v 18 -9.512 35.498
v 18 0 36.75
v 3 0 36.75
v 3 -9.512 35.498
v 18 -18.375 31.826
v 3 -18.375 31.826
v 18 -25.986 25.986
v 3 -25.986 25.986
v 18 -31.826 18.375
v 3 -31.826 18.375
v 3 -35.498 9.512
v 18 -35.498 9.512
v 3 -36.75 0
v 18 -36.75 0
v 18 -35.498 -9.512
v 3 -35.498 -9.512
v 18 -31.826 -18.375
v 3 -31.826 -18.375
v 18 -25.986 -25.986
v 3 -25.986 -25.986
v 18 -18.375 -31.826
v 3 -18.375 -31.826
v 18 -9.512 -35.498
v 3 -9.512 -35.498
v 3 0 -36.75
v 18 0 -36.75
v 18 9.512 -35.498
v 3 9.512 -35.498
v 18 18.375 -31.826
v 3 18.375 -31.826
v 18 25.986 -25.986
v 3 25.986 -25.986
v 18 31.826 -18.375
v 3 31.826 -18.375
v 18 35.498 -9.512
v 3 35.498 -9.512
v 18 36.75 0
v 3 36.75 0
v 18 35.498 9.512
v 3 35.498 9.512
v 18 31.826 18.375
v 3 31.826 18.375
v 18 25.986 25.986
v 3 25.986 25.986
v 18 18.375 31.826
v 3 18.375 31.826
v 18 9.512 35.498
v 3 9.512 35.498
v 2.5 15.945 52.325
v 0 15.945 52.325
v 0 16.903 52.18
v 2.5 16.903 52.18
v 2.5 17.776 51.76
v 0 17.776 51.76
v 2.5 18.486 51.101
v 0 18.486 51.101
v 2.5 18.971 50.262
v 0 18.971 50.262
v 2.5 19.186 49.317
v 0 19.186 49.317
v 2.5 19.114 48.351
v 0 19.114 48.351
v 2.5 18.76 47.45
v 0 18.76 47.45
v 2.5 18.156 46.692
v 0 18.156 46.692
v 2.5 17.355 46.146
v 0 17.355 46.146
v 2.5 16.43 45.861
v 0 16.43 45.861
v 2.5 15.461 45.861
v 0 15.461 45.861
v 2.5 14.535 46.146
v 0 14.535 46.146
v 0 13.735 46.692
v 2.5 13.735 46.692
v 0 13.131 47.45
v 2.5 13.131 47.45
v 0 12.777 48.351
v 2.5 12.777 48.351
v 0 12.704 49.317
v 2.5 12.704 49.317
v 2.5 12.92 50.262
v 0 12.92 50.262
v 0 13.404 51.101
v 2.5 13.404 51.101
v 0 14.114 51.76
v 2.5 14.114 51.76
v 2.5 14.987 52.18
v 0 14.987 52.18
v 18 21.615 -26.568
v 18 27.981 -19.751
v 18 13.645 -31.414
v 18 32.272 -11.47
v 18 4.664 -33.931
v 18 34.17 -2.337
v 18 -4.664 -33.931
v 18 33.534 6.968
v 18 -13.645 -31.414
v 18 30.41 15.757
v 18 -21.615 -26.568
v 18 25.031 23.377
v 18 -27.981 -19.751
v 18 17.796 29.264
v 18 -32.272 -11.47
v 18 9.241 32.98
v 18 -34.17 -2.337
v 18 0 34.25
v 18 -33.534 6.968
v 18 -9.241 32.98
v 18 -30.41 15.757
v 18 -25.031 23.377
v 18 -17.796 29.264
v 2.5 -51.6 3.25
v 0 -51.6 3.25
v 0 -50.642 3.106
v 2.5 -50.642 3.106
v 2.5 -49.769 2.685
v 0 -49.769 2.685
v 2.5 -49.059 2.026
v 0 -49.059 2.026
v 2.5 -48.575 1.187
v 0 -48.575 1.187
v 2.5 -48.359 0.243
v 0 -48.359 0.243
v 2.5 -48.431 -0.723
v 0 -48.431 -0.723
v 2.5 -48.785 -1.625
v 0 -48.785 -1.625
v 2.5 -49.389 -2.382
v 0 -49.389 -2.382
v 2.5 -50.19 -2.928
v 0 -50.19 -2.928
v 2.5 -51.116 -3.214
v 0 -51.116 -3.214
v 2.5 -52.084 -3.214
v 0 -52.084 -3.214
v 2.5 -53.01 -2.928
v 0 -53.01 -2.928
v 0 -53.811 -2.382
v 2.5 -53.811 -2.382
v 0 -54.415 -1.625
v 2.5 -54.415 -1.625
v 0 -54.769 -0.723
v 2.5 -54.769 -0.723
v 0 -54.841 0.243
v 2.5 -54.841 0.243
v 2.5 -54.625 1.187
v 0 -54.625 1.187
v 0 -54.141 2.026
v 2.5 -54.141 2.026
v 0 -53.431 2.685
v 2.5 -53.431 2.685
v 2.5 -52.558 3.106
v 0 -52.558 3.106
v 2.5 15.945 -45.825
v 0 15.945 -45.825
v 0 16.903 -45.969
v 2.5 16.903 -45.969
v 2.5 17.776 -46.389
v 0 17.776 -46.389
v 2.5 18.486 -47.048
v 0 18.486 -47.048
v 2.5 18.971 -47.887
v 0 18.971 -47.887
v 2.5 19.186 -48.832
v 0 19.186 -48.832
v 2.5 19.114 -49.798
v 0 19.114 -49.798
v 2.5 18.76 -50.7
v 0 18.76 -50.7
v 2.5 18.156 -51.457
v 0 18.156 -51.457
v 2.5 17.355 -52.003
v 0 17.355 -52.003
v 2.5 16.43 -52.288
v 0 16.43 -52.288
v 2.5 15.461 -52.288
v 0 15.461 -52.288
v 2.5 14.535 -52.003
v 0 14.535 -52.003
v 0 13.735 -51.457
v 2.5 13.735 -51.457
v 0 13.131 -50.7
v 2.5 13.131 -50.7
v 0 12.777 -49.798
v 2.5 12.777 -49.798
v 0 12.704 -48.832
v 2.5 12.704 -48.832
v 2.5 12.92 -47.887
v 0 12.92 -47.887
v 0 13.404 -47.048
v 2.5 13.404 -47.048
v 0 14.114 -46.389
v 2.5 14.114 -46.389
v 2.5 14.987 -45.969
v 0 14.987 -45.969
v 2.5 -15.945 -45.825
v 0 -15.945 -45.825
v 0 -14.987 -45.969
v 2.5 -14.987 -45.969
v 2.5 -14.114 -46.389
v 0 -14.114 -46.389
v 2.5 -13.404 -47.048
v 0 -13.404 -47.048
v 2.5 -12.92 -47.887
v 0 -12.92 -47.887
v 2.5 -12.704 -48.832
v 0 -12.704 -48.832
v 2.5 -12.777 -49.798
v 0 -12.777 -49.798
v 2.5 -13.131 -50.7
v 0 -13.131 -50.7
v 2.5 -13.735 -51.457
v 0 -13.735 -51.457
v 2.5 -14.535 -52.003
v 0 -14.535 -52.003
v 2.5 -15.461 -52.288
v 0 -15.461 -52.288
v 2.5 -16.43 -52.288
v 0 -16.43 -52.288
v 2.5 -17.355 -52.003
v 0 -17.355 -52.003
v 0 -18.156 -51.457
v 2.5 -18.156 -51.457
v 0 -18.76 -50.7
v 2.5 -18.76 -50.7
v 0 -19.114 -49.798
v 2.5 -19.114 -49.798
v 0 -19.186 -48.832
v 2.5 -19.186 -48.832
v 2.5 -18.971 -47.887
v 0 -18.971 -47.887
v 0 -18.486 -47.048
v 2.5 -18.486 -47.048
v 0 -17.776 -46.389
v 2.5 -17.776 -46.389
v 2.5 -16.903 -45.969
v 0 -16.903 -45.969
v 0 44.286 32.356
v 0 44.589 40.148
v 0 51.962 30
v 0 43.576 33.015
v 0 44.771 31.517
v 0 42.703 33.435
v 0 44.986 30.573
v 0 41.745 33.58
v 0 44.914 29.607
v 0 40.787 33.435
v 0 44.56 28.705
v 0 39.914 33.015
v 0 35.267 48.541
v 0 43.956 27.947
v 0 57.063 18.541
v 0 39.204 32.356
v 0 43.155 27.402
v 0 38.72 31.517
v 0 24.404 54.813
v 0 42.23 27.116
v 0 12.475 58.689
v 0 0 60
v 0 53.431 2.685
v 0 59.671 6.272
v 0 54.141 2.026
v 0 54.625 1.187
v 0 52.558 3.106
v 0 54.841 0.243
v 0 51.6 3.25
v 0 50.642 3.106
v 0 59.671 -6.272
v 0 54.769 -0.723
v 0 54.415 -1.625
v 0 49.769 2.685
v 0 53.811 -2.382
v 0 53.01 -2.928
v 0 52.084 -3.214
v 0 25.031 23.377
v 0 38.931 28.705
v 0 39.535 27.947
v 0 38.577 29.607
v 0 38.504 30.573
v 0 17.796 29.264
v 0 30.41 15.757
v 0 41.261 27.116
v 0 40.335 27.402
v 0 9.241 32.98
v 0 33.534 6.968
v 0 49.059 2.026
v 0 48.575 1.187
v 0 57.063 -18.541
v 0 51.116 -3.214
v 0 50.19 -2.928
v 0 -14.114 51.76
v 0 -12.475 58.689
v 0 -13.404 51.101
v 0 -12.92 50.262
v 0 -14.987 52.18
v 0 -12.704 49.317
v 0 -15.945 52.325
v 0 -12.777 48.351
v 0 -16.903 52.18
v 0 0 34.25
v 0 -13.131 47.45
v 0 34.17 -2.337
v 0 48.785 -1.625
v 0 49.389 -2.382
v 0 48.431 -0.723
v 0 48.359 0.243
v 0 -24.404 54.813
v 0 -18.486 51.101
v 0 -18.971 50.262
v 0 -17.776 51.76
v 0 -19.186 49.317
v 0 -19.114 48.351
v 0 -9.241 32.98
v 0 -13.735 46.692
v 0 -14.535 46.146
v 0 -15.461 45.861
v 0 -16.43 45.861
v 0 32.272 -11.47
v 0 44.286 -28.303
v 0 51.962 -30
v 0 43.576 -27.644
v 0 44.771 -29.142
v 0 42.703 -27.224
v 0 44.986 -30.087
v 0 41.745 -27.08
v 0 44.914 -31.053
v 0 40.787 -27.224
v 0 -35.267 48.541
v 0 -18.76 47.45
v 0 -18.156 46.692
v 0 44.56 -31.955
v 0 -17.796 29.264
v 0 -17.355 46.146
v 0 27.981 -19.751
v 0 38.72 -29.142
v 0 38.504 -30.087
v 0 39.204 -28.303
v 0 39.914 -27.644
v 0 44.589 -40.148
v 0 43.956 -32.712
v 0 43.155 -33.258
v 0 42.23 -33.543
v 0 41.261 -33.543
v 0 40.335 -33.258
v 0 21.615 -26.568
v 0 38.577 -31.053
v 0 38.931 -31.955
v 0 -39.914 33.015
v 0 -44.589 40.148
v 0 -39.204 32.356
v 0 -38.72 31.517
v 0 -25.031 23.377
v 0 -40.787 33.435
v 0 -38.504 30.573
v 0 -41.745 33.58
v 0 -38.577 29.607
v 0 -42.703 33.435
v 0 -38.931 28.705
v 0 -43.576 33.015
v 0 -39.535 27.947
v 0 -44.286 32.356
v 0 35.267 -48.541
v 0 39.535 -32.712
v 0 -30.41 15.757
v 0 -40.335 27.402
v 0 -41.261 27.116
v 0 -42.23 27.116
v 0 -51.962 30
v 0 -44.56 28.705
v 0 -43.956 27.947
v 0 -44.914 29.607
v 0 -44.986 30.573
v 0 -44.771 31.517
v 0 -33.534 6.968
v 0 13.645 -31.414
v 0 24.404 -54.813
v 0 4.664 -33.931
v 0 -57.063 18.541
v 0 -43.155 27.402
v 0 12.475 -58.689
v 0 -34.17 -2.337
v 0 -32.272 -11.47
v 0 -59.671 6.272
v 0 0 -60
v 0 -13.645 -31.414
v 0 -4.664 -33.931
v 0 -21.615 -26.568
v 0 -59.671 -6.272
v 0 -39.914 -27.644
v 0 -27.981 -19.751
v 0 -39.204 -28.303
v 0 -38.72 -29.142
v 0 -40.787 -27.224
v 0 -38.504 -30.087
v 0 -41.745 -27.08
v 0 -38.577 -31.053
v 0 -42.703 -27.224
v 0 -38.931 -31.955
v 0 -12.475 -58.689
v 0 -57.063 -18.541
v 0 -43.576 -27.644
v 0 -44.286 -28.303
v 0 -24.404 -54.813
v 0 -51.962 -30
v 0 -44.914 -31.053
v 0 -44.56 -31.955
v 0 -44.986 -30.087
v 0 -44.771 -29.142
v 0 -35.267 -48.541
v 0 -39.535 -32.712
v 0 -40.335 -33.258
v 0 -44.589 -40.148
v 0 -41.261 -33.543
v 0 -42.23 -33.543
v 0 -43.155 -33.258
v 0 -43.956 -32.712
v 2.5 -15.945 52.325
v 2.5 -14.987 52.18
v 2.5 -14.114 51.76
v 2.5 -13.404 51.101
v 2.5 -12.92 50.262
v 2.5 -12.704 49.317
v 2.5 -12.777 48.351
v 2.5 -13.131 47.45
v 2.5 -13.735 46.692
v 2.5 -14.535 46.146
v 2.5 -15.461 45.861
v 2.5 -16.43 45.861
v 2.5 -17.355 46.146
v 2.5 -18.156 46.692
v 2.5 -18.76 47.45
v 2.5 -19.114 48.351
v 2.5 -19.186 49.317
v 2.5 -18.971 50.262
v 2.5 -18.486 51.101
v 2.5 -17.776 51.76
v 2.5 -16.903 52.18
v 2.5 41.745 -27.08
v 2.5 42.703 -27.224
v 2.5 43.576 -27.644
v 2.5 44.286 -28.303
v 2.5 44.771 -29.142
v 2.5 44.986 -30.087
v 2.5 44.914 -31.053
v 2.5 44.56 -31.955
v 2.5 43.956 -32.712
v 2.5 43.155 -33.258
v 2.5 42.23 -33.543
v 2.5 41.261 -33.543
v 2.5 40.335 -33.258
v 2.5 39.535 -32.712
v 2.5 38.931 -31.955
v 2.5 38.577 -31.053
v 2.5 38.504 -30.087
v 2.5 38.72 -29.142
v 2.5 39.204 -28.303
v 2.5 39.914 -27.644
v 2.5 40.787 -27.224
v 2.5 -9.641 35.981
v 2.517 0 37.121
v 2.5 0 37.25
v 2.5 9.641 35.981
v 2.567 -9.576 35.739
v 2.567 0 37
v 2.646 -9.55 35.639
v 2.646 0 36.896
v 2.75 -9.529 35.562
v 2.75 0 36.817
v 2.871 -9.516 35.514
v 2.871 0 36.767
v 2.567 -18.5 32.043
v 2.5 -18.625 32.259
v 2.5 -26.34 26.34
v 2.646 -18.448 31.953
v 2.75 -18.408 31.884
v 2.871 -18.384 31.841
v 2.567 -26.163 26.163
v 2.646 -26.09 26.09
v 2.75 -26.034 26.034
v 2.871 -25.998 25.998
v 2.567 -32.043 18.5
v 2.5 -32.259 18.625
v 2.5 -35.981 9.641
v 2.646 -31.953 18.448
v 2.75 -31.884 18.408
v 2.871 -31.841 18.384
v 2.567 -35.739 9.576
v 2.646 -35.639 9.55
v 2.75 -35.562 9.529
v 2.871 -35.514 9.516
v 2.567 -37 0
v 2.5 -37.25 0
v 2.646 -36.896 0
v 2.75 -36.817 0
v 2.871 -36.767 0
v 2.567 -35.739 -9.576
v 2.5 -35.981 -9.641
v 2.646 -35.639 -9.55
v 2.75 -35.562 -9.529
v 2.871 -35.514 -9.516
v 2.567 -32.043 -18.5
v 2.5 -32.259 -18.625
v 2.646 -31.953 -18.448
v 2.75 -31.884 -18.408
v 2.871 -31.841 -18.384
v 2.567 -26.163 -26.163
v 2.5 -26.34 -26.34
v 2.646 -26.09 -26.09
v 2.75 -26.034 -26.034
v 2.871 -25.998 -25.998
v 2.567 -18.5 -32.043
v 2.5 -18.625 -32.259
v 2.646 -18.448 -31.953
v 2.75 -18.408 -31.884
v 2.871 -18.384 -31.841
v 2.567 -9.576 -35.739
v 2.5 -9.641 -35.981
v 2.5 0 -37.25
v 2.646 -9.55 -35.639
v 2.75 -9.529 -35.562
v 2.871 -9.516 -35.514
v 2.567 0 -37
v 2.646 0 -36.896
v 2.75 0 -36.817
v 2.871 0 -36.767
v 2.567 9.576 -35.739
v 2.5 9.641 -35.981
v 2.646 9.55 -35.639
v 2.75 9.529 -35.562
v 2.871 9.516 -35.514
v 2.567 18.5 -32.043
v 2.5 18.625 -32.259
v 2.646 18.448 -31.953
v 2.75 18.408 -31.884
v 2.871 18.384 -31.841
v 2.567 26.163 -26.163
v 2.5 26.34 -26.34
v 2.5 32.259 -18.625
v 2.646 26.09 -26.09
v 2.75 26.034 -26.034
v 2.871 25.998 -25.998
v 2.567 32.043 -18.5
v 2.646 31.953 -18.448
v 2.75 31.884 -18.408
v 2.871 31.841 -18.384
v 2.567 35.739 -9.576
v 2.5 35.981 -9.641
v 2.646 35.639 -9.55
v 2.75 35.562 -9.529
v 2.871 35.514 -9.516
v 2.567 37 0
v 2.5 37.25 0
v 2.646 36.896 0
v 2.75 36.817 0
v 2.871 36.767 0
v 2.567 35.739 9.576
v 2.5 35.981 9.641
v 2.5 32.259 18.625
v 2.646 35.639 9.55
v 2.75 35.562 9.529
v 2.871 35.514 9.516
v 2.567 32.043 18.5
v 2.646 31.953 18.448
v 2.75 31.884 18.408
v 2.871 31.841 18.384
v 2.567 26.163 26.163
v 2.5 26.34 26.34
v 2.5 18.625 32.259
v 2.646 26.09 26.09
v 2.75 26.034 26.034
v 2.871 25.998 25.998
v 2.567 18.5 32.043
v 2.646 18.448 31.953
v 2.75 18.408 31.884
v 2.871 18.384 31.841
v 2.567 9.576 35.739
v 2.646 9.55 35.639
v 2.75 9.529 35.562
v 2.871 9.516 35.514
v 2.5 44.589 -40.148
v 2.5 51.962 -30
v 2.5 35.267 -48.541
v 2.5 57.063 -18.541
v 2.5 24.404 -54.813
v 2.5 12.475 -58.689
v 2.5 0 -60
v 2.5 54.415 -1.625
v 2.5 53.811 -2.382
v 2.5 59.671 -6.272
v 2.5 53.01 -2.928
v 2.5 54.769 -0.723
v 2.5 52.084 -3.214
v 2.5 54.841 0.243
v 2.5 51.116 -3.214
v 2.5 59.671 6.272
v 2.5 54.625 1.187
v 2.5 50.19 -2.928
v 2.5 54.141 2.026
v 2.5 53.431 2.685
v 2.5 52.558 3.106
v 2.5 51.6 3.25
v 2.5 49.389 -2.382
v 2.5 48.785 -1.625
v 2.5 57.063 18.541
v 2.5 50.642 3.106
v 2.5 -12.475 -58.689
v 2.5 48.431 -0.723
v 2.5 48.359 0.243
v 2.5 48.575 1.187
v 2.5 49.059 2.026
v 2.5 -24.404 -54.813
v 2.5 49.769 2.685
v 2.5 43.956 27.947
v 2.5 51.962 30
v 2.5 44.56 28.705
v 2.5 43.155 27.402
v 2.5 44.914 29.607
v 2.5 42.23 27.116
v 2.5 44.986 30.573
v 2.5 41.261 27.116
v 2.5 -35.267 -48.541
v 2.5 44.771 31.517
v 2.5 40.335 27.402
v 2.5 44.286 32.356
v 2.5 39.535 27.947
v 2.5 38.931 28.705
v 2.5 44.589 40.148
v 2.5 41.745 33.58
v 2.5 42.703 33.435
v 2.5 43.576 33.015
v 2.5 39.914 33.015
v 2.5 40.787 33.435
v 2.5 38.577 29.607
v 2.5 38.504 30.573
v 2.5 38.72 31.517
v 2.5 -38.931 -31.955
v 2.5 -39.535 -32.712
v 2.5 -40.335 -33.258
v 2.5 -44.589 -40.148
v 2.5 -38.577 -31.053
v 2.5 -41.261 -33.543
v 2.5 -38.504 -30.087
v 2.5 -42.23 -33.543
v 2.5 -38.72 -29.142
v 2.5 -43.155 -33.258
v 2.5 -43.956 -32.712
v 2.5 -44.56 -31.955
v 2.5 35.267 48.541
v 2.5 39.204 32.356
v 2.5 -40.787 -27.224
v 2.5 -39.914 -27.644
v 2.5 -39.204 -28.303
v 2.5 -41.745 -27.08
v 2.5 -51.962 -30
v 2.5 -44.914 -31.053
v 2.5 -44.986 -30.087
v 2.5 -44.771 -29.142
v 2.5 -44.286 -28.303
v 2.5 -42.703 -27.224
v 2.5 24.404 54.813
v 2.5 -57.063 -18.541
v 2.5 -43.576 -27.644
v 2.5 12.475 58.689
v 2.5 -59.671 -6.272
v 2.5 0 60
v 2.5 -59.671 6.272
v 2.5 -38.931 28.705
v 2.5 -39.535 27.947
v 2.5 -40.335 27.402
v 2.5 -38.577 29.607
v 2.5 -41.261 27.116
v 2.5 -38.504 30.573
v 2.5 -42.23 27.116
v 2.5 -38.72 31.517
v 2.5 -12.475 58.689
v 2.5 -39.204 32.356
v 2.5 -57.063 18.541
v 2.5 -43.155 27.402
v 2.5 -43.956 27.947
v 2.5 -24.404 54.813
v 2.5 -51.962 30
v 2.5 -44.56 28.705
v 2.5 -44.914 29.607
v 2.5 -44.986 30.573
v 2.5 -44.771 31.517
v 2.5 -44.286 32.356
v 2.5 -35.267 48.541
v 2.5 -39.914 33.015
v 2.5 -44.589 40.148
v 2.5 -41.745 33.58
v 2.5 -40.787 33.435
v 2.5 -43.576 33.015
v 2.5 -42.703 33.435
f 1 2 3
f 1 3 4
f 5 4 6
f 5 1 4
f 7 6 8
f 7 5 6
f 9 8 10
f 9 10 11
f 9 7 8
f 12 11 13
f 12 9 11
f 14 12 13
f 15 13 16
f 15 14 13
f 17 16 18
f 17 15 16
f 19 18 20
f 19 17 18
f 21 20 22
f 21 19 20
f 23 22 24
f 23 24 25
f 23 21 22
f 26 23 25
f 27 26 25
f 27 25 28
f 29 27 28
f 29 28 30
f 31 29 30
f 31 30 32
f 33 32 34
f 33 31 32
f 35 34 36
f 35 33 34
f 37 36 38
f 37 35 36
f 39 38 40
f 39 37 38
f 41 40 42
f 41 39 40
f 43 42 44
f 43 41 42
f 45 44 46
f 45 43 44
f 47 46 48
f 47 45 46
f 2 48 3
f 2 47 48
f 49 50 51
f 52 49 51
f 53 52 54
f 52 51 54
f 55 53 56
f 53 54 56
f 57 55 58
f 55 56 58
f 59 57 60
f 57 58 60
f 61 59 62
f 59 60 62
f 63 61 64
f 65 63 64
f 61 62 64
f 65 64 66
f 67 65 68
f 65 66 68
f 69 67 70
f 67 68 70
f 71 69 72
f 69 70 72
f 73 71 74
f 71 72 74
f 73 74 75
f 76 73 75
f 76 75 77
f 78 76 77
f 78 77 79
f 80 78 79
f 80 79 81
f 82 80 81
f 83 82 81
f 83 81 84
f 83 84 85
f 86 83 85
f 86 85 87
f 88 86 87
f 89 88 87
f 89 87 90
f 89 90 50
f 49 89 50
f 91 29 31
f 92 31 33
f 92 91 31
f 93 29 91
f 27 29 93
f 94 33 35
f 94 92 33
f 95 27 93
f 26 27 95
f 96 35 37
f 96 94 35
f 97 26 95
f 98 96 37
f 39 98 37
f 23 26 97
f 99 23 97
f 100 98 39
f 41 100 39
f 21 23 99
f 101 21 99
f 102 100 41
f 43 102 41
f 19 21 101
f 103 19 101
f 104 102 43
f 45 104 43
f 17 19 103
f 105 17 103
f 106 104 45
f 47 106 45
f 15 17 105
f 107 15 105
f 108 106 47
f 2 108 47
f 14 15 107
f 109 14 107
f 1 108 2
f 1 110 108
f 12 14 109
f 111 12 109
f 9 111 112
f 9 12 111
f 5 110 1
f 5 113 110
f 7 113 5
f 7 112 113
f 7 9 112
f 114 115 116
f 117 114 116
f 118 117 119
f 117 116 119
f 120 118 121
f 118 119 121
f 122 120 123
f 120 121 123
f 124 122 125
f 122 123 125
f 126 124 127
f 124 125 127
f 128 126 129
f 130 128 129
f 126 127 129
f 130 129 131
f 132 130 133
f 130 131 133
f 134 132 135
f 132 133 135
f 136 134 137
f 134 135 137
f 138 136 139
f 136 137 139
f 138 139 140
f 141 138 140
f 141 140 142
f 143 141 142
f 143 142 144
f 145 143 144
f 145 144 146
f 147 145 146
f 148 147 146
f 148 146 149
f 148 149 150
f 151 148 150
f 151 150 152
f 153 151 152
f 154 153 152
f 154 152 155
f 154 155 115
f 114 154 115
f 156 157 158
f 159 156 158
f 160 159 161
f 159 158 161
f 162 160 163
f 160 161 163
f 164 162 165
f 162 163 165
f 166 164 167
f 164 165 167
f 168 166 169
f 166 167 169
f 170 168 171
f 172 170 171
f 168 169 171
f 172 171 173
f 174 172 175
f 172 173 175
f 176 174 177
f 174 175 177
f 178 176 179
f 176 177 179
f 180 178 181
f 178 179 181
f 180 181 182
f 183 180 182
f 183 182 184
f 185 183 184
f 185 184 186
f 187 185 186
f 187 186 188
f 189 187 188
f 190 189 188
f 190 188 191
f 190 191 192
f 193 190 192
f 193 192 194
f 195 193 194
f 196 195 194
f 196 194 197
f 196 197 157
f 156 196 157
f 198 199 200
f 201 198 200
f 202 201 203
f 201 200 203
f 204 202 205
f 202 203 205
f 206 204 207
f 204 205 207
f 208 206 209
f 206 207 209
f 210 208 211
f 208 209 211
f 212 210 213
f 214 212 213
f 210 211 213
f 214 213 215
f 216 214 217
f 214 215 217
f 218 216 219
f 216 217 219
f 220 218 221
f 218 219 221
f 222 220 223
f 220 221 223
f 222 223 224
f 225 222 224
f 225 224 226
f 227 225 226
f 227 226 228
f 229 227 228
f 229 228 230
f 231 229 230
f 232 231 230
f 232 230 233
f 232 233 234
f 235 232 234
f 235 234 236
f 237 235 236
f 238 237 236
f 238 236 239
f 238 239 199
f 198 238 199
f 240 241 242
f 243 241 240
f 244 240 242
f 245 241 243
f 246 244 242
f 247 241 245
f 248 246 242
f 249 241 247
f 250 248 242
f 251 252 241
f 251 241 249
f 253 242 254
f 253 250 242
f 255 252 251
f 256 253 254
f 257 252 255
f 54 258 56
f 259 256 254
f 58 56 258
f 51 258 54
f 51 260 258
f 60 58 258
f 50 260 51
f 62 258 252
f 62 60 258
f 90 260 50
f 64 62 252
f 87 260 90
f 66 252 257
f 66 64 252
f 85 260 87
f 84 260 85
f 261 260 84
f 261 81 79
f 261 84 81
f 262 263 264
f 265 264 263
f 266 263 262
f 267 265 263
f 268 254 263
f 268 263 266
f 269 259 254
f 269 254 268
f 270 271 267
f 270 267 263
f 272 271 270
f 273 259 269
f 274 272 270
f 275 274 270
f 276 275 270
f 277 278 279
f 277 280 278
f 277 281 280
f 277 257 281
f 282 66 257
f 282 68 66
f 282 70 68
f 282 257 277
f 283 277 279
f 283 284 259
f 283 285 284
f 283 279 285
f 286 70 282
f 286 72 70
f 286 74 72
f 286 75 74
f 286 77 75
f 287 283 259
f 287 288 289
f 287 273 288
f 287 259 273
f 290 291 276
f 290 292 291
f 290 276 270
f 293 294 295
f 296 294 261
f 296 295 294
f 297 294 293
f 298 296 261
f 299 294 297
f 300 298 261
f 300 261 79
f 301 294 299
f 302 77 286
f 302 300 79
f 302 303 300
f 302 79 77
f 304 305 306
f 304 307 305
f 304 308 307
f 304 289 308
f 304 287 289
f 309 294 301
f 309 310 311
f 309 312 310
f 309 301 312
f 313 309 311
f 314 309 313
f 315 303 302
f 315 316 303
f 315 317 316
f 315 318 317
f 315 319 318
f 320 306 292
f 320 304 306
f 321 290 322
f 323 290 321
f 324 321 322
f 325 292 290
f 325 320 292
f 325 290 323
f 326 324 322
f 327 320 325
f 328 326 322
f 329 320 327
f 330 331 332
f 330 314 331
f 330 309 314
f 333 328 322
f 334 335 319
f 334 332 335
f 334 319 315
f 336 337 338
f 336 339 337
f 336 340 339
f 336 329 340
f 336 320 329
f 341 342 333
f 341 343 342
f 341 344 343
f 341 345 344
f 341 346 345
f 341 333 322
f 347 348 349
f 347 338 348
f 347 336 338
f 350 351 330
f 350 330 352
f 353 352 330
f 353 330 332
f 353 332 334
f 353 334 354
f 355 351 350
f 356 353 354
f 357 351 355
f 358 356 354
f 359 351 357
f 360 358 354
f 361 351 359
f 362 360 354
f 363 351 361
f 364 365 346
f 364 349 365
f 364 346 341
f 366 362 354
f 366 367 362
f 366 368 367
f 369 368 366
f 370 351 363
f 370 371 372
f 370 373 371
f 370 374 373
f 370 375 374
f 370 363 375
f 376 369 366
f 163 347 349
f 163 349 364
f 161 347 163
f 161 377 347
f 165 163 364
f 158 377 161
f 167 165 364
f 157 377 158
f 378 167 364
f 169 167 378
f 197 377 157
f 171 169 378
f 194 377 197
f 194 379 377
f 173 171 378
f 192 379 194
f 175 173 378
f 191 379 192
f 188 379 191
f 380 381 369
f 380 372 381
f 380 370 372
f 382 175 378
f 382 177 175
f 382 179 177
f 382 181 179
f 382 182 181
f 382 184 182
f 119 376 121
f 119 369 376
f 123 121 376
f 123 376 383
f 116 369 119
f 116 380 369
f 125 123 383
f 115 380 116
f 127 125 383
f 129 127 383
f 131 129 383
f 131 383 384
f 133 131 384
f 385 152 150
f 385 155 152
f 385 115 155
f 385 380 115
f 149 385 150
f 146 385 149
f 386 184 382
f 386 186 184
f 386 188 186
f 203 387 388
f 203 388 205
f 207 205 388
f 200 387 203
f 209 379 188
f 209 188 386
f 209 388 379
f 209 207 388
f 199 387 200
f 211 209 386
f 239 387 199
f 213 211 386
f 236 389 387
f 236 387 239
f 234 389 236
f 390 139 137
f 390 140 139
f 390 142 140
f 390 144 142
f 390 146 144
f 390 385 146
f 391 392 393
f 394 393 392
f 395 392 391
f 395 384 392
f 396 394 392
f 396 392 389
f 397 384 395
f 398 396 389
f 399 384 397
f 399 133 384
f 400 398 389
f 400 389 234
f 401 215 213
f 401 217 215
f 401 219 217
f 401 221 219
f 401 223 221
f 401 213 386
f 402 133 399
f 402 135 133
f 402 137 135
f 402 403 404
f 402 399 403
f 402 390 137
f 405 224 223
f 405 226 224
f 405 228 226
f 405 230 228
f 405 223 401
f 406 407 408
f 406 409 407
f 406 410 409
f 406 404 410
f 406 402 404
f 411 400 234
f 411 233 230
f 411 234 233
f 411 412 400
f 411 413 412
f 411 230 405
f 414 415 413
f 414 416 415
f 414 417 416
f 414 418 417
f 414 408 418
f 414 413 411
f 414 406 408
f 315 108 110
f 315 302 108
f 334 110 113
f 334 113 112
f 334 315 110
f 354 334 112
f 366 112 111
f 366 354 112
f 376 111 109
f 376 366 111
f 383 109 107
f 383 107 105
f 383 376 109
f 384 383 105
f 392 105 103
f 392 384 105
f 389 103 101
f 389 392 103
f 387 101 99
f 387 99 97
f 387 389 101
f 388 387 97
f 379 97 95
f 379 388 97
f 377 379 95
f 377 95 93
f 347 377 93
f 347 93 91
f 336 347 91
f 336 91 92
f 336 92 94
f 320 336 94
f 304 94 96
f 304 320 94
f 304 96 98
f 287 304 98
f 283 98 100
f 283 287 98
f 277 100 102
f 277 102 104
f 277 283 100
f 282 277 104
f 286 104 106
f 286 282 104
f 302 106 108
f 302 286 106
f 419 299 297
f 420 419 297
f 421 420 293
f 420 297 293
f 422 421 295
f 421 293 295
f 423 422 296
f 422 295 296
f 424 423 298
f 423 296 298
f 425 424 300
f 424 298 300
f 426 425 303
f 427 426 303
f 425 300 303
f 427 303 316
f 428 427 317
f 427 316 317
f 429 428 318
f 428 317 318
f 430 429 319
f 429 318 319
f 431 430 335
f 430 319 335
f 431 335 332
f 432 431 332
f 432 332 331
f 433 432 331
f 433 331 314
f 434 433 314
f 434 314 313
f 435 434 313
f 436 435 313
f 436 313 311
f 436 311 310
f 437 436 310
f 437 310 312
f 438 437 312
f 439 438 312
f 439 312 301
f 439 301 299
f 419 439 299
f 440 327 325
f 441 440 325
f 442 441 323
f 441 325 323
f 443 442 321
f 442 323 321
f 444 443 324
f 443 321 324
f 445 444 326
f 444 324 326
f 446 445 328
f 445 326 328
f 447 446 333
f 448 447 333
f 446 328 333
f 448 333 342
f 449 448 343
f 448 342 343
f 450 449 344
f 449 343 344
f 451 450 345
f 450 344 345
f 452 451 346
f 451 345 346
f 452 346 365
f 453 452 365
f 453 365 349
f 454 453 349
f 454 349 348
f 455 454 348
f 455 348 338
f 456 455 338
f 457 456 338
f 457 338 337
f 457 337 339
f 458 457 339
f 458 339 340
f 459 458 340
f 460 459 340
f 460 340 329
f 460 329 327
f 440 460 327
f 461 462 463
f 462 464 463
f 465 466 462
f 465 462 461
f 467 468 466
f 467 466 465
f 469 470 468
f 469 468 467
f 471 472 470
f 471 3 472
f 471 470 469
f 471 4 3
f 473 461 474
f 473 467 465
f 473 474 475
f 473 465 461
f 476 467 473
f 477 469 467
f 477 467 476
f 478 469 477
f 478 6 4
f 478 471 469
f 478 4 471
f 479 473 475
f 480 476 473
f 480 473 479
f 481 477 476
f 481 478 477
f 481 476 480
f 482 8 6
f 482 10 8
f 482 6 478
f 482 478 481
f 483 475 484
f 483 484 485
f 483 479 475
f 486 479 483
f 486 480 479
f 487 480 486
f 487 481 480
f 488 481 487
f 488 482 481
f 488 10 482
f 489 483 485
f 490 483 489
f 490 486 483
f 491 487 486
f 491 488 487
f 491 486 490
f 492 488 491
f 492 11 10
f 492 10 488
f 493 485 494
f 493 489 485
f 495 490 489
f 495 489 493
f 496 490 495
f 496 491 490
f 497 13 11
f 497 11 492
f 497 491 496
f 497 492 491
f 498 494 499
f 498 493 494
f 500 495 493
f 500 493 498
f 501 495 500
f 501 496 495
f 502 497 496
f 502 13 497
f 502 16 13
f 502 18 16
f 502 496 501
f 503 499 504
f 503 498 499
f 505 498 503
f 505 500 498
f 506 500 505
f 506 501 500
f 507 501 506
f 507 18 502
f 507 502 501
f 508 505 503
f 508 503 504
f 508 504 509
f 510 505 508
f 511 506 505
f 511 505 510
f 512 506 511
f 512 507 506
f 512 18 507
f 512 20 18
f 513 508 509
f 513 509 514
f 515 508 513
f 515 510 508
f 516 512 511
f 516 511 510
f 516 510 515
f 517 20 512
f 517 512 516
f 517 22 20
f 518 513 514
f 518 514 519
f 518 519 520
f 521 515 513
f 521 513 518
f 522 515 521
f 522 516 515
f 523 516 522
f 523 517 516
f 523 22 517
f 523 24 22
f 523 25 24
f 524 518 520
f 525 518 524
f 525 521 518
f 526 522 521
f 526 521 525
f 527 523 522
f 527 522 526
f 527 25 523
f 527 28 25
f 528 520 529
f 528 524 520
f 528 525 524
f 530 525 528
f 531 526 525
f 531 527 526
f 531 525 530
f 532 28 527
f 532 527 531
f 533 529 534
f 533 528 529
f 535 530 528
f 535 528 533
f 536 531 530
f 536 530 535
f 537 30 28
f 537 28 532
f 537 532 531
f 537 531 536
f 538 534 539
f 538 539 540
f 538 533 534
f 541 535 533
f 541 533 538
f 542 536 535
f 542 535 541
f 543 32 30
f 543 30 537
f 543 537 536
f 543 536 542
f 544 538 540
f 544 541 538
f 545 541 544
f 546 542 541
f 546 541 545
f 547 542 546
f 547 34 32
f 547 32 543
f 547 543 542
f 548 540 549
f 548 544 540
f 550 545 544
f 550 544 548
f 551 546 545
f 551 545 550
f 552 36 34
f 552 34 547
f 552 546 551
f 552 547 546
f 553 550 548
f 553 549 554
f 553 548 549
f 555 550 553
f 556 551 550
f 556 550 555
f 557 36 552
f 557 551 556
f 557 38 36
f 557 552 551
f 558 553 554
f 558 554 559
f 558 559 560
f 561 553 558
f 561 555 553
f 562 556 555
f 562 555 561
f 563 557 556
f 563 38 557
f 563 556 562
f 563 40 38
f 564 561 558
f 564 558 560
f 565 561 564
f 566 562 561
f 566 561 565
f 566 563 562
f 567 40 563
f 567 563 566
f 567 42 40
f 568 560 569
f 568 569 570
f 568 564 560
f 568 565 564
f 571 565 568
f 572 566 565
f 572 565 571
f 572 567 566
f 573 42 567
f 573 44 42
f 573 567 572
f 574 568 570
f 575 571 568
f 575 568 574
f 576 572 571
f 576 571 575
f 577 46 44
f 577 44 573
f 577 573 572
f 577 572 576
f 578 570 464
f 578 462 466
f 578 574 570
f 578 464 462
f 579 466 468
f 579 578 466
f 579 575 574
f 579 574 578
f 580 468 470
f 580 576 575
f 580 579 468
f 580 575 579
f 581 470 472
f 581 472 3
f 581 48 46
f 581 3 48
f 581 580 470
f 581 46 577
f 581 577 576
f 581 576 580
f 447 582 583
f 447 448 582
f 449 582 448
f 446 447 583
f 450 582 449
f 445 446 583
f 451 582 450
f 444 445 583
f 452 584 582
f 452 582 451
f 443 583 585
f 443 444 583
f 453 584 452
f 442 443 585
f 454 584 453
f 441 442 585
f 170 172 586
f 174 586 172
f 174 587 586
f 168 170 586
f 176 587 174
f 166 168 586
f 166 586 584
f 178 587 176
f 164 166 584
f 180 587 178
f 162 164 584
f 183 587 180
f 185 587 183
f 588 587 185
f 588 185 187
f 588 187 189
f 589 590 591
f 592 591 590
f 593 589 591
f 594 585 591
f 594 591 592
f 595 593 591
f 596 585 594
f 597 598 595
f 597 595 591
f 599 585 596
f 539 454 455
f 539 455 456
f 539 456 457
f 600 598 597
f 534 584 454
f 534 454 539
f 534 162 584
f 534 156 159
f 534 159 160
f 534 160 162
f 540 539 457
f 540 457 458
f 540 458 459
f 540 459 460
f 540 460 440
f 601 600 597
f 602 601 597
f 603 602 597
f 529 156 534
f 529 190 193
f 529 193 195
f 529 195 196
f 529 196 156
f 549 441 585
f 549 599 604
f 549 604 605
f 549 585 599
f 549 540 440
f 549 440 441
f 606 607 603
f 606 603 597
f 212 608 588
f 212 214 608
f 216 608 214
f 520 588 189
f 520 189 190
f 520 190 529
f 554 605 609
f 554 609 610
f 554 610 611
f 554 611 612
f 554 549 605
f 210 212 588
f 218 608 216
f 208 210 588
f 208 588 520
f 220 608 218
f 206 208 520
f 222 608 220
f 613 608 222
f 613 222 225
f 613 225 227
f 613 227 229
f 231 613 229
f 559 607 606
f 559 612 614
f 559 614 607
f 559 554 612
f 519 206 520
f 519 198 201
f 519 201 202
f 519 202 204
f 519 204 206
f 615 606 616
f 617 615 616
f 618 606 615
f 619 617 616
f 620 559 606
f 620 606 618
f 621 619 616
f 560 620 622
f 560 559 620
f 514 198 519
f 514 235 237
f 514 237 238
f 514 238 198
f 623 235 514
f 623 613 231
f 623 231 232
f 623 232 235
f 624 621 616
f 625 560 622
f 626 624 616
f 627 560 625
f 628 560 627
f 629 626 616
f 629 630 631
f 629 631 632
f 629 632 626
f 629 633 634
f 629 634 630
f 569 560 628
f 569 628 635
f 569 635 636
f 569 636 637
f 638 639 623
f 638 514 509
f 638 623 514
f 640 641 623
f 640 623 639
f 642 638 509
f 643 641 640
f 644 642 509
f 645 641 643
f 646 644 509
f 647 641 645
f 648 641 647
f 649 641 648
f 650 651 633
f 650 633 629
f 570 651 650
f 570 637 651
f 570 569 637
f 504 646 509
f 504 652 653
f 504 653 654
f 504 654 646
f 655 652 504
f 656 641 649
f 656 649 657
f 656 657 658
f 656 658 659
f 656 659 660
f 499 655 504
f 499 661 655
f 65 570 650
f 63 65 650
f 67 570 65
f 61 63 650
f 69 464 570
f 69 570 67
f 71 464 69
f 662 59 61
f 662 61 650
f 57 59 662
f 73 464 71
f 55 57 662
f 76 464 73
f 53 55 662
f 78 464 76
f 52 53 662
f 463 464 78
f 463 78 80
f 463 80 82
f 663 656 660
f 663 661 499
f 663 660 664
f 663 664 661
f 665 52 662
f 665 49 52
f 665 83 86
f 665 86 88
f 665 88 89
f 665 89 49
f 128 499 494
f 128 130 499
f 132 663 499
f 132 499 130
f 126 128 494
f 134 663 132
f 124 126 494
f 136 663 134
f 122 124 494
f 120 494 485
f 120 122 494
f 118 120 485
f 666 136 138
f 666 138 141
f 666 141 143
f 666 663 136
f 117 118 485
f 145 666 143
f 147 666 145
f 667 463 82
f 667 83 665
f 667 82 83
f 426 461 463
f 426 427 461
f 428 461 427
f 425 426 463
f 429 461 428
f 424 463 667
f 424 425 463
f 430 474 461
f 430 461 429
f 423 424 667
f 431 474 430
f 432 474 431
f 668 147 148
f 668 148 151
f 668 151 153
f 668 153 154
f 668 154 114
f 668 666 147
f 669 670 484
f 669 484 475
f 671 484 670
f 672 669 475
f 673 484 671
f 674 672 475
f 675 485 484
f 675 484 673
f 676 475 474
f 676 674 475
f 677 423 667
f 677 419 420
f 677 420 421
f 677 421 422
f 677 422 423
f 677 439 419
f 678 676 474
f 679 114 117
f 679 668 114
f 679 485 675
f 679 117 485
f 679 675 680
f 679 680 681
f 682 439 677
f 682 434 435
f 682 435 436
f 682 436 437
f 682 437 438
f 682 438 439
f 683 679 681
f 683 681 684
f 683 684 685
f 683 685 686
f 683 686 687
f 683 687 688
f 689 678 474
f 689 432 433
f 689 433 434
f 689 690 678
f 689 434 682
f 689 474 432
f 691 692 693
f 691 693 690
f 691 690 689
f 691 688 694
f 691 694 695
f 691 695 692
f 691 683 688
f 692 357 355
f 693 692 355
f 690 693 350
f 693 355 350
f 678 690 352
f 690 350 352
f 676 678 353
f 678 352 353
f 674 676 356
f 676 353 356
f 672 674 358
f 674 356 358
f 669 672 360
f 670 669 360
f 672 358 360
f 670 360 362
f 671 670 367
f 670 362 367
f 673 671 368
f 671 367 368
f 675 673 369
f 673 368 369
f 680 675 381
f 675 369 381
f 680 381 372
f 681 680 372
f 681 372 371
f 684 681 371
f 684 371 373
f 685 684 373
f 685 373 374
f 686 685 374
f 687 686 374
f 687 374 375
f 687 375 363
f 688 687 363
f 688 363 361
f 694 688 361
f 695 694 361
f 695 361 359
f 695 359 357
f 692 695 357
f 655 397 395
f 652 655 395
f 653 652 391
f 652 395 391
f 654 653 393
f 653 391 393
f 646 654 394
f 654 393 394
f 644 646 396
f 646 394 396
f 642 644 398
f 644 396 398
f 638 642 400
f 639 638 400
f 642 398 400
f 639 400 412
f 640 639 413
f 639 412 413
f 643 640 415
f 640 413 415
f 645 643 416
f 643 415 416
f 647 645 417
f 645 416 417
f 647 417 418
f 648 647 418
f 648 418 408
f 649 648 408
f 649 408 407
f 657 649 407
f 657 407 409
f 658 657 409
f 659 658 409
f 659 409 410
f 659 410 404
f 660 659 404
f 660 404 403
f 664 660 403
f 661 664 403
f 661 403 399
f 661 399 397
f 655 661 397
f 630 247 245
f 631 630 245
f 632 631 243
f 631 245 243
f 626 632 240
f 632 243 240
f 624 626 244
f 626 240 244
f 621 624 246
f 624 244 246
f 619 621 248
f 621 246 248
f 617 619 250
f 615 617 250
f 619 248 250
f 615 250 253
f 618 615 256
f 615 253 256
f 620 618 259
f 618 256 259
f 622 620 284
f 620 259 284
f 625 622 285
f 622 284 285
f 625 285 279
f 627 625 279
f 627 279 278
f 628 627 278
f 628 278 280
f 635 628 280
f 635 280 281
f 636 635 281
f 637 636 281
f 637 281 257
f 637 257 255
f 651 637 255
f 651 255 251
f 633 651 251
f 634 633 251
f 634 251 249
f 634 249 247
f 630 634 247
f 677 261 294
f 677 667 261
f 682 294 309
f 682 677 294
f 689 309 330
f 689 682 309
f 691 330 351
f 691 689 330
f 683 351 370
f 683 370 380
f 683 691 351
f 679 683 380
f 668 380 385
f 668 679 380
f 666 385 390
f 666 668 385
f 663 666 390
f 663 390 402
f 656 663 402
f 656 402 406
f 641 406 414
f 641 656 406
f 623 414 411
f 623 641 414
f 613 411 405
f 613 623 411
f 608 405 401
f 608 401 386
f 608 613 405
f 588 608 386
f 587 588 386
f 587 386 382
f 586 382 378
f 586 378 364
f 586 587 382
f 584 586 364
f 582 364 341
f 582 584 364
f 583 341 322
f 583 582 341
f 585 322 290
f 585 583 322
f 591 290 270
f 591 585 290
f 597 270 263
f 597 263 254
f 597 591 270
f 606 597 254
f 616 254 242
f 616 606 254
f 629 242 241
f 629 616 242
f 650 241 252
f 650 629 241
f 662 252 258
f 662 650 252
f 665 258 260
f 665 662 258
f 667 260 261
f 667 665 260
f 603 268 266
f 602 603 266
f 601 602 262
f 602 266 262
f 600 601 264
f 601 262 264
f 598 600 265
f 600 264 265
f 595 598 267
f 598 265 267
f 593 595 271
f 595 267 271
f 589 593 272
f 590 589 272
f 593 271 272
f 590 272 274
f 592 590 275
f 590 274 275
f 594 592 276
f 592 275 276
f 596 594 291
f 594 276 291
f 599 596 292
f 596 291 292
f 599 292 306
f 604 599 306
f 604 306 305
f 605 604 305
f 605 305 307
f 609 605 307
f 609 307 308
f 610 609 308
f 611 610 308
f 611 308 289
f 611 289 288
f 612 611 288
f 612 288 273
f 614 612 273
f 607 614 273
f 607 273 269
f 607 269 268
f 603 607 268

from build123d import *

# Parameters (mm, degrees)
SKETCH4_R          = 3.25
CUT_EXTRUDE1_DEPTH = 10
FILLET2_R          = 0.5


with BuildPart() as part:
    # Sketch3 → Revolve1 (revolve)
    with BuildSketch(Plane.XY, mode=Mode.PRIVATE) as revolve1_sk:
        Polygon((0, 34.25), (0, 60), (2.5, 60), (2.5, 36.75), (18, 36.75), (18, 34.25), align=None)
    revolve(revolve1_sk.sketch.rotate(Axis((0, 0, 0), (1, 0, 0)), 90), axis=Axis((0, 0, 0), (1, 0, 0)))

    # Sketch4 → Cut-Extrude1 (cut)
    with BuildSketch(Plane.ZY):
        with Locations((30.329719018, 41.74527691)):
            Circle(SKETCH4_R)
        with Locations((0, 51.6)):
            Circle(SKETCH4_R)
        with Locations((49.074516241, 15.94527691)):
            Circle(SKETCH4_R)
        with Locations((49.074516241, -15.94527691)):
            Circle(SKETCH4_R)
        with Locations((30.329719018, -41.74527691)):
            Circle(SKETCH4_R)
        with Locations((0, -51.6)):
            Circle(SKETCH4_R)
        with Locations((-30.329719018, -41.74527691)):
            Circle(SKETCH4_R)
        with Locations((-49.074516241, -15.94527691)):
            Circle(SKETCH4_R)
        with Locations((-49.074516241, 15.94527691)):
            Circle(SKETCH4_R)
        with Locations((-30.329719018, 41.74527691)):
            Circle(SKETCH4_R)
    extrude(amount=-CUT_EXTRUDE1_DEPTH, mode=Mode.SUBTRACT)

    # Fillet2
    fillet2_edges = [part.edges().sort_by_distance(p)[0] for p in [
        (2.5, 0, -36.75),
    ]]
    fillet(fillet2_edges, radius=FILLET2_R)


solid = part.part
